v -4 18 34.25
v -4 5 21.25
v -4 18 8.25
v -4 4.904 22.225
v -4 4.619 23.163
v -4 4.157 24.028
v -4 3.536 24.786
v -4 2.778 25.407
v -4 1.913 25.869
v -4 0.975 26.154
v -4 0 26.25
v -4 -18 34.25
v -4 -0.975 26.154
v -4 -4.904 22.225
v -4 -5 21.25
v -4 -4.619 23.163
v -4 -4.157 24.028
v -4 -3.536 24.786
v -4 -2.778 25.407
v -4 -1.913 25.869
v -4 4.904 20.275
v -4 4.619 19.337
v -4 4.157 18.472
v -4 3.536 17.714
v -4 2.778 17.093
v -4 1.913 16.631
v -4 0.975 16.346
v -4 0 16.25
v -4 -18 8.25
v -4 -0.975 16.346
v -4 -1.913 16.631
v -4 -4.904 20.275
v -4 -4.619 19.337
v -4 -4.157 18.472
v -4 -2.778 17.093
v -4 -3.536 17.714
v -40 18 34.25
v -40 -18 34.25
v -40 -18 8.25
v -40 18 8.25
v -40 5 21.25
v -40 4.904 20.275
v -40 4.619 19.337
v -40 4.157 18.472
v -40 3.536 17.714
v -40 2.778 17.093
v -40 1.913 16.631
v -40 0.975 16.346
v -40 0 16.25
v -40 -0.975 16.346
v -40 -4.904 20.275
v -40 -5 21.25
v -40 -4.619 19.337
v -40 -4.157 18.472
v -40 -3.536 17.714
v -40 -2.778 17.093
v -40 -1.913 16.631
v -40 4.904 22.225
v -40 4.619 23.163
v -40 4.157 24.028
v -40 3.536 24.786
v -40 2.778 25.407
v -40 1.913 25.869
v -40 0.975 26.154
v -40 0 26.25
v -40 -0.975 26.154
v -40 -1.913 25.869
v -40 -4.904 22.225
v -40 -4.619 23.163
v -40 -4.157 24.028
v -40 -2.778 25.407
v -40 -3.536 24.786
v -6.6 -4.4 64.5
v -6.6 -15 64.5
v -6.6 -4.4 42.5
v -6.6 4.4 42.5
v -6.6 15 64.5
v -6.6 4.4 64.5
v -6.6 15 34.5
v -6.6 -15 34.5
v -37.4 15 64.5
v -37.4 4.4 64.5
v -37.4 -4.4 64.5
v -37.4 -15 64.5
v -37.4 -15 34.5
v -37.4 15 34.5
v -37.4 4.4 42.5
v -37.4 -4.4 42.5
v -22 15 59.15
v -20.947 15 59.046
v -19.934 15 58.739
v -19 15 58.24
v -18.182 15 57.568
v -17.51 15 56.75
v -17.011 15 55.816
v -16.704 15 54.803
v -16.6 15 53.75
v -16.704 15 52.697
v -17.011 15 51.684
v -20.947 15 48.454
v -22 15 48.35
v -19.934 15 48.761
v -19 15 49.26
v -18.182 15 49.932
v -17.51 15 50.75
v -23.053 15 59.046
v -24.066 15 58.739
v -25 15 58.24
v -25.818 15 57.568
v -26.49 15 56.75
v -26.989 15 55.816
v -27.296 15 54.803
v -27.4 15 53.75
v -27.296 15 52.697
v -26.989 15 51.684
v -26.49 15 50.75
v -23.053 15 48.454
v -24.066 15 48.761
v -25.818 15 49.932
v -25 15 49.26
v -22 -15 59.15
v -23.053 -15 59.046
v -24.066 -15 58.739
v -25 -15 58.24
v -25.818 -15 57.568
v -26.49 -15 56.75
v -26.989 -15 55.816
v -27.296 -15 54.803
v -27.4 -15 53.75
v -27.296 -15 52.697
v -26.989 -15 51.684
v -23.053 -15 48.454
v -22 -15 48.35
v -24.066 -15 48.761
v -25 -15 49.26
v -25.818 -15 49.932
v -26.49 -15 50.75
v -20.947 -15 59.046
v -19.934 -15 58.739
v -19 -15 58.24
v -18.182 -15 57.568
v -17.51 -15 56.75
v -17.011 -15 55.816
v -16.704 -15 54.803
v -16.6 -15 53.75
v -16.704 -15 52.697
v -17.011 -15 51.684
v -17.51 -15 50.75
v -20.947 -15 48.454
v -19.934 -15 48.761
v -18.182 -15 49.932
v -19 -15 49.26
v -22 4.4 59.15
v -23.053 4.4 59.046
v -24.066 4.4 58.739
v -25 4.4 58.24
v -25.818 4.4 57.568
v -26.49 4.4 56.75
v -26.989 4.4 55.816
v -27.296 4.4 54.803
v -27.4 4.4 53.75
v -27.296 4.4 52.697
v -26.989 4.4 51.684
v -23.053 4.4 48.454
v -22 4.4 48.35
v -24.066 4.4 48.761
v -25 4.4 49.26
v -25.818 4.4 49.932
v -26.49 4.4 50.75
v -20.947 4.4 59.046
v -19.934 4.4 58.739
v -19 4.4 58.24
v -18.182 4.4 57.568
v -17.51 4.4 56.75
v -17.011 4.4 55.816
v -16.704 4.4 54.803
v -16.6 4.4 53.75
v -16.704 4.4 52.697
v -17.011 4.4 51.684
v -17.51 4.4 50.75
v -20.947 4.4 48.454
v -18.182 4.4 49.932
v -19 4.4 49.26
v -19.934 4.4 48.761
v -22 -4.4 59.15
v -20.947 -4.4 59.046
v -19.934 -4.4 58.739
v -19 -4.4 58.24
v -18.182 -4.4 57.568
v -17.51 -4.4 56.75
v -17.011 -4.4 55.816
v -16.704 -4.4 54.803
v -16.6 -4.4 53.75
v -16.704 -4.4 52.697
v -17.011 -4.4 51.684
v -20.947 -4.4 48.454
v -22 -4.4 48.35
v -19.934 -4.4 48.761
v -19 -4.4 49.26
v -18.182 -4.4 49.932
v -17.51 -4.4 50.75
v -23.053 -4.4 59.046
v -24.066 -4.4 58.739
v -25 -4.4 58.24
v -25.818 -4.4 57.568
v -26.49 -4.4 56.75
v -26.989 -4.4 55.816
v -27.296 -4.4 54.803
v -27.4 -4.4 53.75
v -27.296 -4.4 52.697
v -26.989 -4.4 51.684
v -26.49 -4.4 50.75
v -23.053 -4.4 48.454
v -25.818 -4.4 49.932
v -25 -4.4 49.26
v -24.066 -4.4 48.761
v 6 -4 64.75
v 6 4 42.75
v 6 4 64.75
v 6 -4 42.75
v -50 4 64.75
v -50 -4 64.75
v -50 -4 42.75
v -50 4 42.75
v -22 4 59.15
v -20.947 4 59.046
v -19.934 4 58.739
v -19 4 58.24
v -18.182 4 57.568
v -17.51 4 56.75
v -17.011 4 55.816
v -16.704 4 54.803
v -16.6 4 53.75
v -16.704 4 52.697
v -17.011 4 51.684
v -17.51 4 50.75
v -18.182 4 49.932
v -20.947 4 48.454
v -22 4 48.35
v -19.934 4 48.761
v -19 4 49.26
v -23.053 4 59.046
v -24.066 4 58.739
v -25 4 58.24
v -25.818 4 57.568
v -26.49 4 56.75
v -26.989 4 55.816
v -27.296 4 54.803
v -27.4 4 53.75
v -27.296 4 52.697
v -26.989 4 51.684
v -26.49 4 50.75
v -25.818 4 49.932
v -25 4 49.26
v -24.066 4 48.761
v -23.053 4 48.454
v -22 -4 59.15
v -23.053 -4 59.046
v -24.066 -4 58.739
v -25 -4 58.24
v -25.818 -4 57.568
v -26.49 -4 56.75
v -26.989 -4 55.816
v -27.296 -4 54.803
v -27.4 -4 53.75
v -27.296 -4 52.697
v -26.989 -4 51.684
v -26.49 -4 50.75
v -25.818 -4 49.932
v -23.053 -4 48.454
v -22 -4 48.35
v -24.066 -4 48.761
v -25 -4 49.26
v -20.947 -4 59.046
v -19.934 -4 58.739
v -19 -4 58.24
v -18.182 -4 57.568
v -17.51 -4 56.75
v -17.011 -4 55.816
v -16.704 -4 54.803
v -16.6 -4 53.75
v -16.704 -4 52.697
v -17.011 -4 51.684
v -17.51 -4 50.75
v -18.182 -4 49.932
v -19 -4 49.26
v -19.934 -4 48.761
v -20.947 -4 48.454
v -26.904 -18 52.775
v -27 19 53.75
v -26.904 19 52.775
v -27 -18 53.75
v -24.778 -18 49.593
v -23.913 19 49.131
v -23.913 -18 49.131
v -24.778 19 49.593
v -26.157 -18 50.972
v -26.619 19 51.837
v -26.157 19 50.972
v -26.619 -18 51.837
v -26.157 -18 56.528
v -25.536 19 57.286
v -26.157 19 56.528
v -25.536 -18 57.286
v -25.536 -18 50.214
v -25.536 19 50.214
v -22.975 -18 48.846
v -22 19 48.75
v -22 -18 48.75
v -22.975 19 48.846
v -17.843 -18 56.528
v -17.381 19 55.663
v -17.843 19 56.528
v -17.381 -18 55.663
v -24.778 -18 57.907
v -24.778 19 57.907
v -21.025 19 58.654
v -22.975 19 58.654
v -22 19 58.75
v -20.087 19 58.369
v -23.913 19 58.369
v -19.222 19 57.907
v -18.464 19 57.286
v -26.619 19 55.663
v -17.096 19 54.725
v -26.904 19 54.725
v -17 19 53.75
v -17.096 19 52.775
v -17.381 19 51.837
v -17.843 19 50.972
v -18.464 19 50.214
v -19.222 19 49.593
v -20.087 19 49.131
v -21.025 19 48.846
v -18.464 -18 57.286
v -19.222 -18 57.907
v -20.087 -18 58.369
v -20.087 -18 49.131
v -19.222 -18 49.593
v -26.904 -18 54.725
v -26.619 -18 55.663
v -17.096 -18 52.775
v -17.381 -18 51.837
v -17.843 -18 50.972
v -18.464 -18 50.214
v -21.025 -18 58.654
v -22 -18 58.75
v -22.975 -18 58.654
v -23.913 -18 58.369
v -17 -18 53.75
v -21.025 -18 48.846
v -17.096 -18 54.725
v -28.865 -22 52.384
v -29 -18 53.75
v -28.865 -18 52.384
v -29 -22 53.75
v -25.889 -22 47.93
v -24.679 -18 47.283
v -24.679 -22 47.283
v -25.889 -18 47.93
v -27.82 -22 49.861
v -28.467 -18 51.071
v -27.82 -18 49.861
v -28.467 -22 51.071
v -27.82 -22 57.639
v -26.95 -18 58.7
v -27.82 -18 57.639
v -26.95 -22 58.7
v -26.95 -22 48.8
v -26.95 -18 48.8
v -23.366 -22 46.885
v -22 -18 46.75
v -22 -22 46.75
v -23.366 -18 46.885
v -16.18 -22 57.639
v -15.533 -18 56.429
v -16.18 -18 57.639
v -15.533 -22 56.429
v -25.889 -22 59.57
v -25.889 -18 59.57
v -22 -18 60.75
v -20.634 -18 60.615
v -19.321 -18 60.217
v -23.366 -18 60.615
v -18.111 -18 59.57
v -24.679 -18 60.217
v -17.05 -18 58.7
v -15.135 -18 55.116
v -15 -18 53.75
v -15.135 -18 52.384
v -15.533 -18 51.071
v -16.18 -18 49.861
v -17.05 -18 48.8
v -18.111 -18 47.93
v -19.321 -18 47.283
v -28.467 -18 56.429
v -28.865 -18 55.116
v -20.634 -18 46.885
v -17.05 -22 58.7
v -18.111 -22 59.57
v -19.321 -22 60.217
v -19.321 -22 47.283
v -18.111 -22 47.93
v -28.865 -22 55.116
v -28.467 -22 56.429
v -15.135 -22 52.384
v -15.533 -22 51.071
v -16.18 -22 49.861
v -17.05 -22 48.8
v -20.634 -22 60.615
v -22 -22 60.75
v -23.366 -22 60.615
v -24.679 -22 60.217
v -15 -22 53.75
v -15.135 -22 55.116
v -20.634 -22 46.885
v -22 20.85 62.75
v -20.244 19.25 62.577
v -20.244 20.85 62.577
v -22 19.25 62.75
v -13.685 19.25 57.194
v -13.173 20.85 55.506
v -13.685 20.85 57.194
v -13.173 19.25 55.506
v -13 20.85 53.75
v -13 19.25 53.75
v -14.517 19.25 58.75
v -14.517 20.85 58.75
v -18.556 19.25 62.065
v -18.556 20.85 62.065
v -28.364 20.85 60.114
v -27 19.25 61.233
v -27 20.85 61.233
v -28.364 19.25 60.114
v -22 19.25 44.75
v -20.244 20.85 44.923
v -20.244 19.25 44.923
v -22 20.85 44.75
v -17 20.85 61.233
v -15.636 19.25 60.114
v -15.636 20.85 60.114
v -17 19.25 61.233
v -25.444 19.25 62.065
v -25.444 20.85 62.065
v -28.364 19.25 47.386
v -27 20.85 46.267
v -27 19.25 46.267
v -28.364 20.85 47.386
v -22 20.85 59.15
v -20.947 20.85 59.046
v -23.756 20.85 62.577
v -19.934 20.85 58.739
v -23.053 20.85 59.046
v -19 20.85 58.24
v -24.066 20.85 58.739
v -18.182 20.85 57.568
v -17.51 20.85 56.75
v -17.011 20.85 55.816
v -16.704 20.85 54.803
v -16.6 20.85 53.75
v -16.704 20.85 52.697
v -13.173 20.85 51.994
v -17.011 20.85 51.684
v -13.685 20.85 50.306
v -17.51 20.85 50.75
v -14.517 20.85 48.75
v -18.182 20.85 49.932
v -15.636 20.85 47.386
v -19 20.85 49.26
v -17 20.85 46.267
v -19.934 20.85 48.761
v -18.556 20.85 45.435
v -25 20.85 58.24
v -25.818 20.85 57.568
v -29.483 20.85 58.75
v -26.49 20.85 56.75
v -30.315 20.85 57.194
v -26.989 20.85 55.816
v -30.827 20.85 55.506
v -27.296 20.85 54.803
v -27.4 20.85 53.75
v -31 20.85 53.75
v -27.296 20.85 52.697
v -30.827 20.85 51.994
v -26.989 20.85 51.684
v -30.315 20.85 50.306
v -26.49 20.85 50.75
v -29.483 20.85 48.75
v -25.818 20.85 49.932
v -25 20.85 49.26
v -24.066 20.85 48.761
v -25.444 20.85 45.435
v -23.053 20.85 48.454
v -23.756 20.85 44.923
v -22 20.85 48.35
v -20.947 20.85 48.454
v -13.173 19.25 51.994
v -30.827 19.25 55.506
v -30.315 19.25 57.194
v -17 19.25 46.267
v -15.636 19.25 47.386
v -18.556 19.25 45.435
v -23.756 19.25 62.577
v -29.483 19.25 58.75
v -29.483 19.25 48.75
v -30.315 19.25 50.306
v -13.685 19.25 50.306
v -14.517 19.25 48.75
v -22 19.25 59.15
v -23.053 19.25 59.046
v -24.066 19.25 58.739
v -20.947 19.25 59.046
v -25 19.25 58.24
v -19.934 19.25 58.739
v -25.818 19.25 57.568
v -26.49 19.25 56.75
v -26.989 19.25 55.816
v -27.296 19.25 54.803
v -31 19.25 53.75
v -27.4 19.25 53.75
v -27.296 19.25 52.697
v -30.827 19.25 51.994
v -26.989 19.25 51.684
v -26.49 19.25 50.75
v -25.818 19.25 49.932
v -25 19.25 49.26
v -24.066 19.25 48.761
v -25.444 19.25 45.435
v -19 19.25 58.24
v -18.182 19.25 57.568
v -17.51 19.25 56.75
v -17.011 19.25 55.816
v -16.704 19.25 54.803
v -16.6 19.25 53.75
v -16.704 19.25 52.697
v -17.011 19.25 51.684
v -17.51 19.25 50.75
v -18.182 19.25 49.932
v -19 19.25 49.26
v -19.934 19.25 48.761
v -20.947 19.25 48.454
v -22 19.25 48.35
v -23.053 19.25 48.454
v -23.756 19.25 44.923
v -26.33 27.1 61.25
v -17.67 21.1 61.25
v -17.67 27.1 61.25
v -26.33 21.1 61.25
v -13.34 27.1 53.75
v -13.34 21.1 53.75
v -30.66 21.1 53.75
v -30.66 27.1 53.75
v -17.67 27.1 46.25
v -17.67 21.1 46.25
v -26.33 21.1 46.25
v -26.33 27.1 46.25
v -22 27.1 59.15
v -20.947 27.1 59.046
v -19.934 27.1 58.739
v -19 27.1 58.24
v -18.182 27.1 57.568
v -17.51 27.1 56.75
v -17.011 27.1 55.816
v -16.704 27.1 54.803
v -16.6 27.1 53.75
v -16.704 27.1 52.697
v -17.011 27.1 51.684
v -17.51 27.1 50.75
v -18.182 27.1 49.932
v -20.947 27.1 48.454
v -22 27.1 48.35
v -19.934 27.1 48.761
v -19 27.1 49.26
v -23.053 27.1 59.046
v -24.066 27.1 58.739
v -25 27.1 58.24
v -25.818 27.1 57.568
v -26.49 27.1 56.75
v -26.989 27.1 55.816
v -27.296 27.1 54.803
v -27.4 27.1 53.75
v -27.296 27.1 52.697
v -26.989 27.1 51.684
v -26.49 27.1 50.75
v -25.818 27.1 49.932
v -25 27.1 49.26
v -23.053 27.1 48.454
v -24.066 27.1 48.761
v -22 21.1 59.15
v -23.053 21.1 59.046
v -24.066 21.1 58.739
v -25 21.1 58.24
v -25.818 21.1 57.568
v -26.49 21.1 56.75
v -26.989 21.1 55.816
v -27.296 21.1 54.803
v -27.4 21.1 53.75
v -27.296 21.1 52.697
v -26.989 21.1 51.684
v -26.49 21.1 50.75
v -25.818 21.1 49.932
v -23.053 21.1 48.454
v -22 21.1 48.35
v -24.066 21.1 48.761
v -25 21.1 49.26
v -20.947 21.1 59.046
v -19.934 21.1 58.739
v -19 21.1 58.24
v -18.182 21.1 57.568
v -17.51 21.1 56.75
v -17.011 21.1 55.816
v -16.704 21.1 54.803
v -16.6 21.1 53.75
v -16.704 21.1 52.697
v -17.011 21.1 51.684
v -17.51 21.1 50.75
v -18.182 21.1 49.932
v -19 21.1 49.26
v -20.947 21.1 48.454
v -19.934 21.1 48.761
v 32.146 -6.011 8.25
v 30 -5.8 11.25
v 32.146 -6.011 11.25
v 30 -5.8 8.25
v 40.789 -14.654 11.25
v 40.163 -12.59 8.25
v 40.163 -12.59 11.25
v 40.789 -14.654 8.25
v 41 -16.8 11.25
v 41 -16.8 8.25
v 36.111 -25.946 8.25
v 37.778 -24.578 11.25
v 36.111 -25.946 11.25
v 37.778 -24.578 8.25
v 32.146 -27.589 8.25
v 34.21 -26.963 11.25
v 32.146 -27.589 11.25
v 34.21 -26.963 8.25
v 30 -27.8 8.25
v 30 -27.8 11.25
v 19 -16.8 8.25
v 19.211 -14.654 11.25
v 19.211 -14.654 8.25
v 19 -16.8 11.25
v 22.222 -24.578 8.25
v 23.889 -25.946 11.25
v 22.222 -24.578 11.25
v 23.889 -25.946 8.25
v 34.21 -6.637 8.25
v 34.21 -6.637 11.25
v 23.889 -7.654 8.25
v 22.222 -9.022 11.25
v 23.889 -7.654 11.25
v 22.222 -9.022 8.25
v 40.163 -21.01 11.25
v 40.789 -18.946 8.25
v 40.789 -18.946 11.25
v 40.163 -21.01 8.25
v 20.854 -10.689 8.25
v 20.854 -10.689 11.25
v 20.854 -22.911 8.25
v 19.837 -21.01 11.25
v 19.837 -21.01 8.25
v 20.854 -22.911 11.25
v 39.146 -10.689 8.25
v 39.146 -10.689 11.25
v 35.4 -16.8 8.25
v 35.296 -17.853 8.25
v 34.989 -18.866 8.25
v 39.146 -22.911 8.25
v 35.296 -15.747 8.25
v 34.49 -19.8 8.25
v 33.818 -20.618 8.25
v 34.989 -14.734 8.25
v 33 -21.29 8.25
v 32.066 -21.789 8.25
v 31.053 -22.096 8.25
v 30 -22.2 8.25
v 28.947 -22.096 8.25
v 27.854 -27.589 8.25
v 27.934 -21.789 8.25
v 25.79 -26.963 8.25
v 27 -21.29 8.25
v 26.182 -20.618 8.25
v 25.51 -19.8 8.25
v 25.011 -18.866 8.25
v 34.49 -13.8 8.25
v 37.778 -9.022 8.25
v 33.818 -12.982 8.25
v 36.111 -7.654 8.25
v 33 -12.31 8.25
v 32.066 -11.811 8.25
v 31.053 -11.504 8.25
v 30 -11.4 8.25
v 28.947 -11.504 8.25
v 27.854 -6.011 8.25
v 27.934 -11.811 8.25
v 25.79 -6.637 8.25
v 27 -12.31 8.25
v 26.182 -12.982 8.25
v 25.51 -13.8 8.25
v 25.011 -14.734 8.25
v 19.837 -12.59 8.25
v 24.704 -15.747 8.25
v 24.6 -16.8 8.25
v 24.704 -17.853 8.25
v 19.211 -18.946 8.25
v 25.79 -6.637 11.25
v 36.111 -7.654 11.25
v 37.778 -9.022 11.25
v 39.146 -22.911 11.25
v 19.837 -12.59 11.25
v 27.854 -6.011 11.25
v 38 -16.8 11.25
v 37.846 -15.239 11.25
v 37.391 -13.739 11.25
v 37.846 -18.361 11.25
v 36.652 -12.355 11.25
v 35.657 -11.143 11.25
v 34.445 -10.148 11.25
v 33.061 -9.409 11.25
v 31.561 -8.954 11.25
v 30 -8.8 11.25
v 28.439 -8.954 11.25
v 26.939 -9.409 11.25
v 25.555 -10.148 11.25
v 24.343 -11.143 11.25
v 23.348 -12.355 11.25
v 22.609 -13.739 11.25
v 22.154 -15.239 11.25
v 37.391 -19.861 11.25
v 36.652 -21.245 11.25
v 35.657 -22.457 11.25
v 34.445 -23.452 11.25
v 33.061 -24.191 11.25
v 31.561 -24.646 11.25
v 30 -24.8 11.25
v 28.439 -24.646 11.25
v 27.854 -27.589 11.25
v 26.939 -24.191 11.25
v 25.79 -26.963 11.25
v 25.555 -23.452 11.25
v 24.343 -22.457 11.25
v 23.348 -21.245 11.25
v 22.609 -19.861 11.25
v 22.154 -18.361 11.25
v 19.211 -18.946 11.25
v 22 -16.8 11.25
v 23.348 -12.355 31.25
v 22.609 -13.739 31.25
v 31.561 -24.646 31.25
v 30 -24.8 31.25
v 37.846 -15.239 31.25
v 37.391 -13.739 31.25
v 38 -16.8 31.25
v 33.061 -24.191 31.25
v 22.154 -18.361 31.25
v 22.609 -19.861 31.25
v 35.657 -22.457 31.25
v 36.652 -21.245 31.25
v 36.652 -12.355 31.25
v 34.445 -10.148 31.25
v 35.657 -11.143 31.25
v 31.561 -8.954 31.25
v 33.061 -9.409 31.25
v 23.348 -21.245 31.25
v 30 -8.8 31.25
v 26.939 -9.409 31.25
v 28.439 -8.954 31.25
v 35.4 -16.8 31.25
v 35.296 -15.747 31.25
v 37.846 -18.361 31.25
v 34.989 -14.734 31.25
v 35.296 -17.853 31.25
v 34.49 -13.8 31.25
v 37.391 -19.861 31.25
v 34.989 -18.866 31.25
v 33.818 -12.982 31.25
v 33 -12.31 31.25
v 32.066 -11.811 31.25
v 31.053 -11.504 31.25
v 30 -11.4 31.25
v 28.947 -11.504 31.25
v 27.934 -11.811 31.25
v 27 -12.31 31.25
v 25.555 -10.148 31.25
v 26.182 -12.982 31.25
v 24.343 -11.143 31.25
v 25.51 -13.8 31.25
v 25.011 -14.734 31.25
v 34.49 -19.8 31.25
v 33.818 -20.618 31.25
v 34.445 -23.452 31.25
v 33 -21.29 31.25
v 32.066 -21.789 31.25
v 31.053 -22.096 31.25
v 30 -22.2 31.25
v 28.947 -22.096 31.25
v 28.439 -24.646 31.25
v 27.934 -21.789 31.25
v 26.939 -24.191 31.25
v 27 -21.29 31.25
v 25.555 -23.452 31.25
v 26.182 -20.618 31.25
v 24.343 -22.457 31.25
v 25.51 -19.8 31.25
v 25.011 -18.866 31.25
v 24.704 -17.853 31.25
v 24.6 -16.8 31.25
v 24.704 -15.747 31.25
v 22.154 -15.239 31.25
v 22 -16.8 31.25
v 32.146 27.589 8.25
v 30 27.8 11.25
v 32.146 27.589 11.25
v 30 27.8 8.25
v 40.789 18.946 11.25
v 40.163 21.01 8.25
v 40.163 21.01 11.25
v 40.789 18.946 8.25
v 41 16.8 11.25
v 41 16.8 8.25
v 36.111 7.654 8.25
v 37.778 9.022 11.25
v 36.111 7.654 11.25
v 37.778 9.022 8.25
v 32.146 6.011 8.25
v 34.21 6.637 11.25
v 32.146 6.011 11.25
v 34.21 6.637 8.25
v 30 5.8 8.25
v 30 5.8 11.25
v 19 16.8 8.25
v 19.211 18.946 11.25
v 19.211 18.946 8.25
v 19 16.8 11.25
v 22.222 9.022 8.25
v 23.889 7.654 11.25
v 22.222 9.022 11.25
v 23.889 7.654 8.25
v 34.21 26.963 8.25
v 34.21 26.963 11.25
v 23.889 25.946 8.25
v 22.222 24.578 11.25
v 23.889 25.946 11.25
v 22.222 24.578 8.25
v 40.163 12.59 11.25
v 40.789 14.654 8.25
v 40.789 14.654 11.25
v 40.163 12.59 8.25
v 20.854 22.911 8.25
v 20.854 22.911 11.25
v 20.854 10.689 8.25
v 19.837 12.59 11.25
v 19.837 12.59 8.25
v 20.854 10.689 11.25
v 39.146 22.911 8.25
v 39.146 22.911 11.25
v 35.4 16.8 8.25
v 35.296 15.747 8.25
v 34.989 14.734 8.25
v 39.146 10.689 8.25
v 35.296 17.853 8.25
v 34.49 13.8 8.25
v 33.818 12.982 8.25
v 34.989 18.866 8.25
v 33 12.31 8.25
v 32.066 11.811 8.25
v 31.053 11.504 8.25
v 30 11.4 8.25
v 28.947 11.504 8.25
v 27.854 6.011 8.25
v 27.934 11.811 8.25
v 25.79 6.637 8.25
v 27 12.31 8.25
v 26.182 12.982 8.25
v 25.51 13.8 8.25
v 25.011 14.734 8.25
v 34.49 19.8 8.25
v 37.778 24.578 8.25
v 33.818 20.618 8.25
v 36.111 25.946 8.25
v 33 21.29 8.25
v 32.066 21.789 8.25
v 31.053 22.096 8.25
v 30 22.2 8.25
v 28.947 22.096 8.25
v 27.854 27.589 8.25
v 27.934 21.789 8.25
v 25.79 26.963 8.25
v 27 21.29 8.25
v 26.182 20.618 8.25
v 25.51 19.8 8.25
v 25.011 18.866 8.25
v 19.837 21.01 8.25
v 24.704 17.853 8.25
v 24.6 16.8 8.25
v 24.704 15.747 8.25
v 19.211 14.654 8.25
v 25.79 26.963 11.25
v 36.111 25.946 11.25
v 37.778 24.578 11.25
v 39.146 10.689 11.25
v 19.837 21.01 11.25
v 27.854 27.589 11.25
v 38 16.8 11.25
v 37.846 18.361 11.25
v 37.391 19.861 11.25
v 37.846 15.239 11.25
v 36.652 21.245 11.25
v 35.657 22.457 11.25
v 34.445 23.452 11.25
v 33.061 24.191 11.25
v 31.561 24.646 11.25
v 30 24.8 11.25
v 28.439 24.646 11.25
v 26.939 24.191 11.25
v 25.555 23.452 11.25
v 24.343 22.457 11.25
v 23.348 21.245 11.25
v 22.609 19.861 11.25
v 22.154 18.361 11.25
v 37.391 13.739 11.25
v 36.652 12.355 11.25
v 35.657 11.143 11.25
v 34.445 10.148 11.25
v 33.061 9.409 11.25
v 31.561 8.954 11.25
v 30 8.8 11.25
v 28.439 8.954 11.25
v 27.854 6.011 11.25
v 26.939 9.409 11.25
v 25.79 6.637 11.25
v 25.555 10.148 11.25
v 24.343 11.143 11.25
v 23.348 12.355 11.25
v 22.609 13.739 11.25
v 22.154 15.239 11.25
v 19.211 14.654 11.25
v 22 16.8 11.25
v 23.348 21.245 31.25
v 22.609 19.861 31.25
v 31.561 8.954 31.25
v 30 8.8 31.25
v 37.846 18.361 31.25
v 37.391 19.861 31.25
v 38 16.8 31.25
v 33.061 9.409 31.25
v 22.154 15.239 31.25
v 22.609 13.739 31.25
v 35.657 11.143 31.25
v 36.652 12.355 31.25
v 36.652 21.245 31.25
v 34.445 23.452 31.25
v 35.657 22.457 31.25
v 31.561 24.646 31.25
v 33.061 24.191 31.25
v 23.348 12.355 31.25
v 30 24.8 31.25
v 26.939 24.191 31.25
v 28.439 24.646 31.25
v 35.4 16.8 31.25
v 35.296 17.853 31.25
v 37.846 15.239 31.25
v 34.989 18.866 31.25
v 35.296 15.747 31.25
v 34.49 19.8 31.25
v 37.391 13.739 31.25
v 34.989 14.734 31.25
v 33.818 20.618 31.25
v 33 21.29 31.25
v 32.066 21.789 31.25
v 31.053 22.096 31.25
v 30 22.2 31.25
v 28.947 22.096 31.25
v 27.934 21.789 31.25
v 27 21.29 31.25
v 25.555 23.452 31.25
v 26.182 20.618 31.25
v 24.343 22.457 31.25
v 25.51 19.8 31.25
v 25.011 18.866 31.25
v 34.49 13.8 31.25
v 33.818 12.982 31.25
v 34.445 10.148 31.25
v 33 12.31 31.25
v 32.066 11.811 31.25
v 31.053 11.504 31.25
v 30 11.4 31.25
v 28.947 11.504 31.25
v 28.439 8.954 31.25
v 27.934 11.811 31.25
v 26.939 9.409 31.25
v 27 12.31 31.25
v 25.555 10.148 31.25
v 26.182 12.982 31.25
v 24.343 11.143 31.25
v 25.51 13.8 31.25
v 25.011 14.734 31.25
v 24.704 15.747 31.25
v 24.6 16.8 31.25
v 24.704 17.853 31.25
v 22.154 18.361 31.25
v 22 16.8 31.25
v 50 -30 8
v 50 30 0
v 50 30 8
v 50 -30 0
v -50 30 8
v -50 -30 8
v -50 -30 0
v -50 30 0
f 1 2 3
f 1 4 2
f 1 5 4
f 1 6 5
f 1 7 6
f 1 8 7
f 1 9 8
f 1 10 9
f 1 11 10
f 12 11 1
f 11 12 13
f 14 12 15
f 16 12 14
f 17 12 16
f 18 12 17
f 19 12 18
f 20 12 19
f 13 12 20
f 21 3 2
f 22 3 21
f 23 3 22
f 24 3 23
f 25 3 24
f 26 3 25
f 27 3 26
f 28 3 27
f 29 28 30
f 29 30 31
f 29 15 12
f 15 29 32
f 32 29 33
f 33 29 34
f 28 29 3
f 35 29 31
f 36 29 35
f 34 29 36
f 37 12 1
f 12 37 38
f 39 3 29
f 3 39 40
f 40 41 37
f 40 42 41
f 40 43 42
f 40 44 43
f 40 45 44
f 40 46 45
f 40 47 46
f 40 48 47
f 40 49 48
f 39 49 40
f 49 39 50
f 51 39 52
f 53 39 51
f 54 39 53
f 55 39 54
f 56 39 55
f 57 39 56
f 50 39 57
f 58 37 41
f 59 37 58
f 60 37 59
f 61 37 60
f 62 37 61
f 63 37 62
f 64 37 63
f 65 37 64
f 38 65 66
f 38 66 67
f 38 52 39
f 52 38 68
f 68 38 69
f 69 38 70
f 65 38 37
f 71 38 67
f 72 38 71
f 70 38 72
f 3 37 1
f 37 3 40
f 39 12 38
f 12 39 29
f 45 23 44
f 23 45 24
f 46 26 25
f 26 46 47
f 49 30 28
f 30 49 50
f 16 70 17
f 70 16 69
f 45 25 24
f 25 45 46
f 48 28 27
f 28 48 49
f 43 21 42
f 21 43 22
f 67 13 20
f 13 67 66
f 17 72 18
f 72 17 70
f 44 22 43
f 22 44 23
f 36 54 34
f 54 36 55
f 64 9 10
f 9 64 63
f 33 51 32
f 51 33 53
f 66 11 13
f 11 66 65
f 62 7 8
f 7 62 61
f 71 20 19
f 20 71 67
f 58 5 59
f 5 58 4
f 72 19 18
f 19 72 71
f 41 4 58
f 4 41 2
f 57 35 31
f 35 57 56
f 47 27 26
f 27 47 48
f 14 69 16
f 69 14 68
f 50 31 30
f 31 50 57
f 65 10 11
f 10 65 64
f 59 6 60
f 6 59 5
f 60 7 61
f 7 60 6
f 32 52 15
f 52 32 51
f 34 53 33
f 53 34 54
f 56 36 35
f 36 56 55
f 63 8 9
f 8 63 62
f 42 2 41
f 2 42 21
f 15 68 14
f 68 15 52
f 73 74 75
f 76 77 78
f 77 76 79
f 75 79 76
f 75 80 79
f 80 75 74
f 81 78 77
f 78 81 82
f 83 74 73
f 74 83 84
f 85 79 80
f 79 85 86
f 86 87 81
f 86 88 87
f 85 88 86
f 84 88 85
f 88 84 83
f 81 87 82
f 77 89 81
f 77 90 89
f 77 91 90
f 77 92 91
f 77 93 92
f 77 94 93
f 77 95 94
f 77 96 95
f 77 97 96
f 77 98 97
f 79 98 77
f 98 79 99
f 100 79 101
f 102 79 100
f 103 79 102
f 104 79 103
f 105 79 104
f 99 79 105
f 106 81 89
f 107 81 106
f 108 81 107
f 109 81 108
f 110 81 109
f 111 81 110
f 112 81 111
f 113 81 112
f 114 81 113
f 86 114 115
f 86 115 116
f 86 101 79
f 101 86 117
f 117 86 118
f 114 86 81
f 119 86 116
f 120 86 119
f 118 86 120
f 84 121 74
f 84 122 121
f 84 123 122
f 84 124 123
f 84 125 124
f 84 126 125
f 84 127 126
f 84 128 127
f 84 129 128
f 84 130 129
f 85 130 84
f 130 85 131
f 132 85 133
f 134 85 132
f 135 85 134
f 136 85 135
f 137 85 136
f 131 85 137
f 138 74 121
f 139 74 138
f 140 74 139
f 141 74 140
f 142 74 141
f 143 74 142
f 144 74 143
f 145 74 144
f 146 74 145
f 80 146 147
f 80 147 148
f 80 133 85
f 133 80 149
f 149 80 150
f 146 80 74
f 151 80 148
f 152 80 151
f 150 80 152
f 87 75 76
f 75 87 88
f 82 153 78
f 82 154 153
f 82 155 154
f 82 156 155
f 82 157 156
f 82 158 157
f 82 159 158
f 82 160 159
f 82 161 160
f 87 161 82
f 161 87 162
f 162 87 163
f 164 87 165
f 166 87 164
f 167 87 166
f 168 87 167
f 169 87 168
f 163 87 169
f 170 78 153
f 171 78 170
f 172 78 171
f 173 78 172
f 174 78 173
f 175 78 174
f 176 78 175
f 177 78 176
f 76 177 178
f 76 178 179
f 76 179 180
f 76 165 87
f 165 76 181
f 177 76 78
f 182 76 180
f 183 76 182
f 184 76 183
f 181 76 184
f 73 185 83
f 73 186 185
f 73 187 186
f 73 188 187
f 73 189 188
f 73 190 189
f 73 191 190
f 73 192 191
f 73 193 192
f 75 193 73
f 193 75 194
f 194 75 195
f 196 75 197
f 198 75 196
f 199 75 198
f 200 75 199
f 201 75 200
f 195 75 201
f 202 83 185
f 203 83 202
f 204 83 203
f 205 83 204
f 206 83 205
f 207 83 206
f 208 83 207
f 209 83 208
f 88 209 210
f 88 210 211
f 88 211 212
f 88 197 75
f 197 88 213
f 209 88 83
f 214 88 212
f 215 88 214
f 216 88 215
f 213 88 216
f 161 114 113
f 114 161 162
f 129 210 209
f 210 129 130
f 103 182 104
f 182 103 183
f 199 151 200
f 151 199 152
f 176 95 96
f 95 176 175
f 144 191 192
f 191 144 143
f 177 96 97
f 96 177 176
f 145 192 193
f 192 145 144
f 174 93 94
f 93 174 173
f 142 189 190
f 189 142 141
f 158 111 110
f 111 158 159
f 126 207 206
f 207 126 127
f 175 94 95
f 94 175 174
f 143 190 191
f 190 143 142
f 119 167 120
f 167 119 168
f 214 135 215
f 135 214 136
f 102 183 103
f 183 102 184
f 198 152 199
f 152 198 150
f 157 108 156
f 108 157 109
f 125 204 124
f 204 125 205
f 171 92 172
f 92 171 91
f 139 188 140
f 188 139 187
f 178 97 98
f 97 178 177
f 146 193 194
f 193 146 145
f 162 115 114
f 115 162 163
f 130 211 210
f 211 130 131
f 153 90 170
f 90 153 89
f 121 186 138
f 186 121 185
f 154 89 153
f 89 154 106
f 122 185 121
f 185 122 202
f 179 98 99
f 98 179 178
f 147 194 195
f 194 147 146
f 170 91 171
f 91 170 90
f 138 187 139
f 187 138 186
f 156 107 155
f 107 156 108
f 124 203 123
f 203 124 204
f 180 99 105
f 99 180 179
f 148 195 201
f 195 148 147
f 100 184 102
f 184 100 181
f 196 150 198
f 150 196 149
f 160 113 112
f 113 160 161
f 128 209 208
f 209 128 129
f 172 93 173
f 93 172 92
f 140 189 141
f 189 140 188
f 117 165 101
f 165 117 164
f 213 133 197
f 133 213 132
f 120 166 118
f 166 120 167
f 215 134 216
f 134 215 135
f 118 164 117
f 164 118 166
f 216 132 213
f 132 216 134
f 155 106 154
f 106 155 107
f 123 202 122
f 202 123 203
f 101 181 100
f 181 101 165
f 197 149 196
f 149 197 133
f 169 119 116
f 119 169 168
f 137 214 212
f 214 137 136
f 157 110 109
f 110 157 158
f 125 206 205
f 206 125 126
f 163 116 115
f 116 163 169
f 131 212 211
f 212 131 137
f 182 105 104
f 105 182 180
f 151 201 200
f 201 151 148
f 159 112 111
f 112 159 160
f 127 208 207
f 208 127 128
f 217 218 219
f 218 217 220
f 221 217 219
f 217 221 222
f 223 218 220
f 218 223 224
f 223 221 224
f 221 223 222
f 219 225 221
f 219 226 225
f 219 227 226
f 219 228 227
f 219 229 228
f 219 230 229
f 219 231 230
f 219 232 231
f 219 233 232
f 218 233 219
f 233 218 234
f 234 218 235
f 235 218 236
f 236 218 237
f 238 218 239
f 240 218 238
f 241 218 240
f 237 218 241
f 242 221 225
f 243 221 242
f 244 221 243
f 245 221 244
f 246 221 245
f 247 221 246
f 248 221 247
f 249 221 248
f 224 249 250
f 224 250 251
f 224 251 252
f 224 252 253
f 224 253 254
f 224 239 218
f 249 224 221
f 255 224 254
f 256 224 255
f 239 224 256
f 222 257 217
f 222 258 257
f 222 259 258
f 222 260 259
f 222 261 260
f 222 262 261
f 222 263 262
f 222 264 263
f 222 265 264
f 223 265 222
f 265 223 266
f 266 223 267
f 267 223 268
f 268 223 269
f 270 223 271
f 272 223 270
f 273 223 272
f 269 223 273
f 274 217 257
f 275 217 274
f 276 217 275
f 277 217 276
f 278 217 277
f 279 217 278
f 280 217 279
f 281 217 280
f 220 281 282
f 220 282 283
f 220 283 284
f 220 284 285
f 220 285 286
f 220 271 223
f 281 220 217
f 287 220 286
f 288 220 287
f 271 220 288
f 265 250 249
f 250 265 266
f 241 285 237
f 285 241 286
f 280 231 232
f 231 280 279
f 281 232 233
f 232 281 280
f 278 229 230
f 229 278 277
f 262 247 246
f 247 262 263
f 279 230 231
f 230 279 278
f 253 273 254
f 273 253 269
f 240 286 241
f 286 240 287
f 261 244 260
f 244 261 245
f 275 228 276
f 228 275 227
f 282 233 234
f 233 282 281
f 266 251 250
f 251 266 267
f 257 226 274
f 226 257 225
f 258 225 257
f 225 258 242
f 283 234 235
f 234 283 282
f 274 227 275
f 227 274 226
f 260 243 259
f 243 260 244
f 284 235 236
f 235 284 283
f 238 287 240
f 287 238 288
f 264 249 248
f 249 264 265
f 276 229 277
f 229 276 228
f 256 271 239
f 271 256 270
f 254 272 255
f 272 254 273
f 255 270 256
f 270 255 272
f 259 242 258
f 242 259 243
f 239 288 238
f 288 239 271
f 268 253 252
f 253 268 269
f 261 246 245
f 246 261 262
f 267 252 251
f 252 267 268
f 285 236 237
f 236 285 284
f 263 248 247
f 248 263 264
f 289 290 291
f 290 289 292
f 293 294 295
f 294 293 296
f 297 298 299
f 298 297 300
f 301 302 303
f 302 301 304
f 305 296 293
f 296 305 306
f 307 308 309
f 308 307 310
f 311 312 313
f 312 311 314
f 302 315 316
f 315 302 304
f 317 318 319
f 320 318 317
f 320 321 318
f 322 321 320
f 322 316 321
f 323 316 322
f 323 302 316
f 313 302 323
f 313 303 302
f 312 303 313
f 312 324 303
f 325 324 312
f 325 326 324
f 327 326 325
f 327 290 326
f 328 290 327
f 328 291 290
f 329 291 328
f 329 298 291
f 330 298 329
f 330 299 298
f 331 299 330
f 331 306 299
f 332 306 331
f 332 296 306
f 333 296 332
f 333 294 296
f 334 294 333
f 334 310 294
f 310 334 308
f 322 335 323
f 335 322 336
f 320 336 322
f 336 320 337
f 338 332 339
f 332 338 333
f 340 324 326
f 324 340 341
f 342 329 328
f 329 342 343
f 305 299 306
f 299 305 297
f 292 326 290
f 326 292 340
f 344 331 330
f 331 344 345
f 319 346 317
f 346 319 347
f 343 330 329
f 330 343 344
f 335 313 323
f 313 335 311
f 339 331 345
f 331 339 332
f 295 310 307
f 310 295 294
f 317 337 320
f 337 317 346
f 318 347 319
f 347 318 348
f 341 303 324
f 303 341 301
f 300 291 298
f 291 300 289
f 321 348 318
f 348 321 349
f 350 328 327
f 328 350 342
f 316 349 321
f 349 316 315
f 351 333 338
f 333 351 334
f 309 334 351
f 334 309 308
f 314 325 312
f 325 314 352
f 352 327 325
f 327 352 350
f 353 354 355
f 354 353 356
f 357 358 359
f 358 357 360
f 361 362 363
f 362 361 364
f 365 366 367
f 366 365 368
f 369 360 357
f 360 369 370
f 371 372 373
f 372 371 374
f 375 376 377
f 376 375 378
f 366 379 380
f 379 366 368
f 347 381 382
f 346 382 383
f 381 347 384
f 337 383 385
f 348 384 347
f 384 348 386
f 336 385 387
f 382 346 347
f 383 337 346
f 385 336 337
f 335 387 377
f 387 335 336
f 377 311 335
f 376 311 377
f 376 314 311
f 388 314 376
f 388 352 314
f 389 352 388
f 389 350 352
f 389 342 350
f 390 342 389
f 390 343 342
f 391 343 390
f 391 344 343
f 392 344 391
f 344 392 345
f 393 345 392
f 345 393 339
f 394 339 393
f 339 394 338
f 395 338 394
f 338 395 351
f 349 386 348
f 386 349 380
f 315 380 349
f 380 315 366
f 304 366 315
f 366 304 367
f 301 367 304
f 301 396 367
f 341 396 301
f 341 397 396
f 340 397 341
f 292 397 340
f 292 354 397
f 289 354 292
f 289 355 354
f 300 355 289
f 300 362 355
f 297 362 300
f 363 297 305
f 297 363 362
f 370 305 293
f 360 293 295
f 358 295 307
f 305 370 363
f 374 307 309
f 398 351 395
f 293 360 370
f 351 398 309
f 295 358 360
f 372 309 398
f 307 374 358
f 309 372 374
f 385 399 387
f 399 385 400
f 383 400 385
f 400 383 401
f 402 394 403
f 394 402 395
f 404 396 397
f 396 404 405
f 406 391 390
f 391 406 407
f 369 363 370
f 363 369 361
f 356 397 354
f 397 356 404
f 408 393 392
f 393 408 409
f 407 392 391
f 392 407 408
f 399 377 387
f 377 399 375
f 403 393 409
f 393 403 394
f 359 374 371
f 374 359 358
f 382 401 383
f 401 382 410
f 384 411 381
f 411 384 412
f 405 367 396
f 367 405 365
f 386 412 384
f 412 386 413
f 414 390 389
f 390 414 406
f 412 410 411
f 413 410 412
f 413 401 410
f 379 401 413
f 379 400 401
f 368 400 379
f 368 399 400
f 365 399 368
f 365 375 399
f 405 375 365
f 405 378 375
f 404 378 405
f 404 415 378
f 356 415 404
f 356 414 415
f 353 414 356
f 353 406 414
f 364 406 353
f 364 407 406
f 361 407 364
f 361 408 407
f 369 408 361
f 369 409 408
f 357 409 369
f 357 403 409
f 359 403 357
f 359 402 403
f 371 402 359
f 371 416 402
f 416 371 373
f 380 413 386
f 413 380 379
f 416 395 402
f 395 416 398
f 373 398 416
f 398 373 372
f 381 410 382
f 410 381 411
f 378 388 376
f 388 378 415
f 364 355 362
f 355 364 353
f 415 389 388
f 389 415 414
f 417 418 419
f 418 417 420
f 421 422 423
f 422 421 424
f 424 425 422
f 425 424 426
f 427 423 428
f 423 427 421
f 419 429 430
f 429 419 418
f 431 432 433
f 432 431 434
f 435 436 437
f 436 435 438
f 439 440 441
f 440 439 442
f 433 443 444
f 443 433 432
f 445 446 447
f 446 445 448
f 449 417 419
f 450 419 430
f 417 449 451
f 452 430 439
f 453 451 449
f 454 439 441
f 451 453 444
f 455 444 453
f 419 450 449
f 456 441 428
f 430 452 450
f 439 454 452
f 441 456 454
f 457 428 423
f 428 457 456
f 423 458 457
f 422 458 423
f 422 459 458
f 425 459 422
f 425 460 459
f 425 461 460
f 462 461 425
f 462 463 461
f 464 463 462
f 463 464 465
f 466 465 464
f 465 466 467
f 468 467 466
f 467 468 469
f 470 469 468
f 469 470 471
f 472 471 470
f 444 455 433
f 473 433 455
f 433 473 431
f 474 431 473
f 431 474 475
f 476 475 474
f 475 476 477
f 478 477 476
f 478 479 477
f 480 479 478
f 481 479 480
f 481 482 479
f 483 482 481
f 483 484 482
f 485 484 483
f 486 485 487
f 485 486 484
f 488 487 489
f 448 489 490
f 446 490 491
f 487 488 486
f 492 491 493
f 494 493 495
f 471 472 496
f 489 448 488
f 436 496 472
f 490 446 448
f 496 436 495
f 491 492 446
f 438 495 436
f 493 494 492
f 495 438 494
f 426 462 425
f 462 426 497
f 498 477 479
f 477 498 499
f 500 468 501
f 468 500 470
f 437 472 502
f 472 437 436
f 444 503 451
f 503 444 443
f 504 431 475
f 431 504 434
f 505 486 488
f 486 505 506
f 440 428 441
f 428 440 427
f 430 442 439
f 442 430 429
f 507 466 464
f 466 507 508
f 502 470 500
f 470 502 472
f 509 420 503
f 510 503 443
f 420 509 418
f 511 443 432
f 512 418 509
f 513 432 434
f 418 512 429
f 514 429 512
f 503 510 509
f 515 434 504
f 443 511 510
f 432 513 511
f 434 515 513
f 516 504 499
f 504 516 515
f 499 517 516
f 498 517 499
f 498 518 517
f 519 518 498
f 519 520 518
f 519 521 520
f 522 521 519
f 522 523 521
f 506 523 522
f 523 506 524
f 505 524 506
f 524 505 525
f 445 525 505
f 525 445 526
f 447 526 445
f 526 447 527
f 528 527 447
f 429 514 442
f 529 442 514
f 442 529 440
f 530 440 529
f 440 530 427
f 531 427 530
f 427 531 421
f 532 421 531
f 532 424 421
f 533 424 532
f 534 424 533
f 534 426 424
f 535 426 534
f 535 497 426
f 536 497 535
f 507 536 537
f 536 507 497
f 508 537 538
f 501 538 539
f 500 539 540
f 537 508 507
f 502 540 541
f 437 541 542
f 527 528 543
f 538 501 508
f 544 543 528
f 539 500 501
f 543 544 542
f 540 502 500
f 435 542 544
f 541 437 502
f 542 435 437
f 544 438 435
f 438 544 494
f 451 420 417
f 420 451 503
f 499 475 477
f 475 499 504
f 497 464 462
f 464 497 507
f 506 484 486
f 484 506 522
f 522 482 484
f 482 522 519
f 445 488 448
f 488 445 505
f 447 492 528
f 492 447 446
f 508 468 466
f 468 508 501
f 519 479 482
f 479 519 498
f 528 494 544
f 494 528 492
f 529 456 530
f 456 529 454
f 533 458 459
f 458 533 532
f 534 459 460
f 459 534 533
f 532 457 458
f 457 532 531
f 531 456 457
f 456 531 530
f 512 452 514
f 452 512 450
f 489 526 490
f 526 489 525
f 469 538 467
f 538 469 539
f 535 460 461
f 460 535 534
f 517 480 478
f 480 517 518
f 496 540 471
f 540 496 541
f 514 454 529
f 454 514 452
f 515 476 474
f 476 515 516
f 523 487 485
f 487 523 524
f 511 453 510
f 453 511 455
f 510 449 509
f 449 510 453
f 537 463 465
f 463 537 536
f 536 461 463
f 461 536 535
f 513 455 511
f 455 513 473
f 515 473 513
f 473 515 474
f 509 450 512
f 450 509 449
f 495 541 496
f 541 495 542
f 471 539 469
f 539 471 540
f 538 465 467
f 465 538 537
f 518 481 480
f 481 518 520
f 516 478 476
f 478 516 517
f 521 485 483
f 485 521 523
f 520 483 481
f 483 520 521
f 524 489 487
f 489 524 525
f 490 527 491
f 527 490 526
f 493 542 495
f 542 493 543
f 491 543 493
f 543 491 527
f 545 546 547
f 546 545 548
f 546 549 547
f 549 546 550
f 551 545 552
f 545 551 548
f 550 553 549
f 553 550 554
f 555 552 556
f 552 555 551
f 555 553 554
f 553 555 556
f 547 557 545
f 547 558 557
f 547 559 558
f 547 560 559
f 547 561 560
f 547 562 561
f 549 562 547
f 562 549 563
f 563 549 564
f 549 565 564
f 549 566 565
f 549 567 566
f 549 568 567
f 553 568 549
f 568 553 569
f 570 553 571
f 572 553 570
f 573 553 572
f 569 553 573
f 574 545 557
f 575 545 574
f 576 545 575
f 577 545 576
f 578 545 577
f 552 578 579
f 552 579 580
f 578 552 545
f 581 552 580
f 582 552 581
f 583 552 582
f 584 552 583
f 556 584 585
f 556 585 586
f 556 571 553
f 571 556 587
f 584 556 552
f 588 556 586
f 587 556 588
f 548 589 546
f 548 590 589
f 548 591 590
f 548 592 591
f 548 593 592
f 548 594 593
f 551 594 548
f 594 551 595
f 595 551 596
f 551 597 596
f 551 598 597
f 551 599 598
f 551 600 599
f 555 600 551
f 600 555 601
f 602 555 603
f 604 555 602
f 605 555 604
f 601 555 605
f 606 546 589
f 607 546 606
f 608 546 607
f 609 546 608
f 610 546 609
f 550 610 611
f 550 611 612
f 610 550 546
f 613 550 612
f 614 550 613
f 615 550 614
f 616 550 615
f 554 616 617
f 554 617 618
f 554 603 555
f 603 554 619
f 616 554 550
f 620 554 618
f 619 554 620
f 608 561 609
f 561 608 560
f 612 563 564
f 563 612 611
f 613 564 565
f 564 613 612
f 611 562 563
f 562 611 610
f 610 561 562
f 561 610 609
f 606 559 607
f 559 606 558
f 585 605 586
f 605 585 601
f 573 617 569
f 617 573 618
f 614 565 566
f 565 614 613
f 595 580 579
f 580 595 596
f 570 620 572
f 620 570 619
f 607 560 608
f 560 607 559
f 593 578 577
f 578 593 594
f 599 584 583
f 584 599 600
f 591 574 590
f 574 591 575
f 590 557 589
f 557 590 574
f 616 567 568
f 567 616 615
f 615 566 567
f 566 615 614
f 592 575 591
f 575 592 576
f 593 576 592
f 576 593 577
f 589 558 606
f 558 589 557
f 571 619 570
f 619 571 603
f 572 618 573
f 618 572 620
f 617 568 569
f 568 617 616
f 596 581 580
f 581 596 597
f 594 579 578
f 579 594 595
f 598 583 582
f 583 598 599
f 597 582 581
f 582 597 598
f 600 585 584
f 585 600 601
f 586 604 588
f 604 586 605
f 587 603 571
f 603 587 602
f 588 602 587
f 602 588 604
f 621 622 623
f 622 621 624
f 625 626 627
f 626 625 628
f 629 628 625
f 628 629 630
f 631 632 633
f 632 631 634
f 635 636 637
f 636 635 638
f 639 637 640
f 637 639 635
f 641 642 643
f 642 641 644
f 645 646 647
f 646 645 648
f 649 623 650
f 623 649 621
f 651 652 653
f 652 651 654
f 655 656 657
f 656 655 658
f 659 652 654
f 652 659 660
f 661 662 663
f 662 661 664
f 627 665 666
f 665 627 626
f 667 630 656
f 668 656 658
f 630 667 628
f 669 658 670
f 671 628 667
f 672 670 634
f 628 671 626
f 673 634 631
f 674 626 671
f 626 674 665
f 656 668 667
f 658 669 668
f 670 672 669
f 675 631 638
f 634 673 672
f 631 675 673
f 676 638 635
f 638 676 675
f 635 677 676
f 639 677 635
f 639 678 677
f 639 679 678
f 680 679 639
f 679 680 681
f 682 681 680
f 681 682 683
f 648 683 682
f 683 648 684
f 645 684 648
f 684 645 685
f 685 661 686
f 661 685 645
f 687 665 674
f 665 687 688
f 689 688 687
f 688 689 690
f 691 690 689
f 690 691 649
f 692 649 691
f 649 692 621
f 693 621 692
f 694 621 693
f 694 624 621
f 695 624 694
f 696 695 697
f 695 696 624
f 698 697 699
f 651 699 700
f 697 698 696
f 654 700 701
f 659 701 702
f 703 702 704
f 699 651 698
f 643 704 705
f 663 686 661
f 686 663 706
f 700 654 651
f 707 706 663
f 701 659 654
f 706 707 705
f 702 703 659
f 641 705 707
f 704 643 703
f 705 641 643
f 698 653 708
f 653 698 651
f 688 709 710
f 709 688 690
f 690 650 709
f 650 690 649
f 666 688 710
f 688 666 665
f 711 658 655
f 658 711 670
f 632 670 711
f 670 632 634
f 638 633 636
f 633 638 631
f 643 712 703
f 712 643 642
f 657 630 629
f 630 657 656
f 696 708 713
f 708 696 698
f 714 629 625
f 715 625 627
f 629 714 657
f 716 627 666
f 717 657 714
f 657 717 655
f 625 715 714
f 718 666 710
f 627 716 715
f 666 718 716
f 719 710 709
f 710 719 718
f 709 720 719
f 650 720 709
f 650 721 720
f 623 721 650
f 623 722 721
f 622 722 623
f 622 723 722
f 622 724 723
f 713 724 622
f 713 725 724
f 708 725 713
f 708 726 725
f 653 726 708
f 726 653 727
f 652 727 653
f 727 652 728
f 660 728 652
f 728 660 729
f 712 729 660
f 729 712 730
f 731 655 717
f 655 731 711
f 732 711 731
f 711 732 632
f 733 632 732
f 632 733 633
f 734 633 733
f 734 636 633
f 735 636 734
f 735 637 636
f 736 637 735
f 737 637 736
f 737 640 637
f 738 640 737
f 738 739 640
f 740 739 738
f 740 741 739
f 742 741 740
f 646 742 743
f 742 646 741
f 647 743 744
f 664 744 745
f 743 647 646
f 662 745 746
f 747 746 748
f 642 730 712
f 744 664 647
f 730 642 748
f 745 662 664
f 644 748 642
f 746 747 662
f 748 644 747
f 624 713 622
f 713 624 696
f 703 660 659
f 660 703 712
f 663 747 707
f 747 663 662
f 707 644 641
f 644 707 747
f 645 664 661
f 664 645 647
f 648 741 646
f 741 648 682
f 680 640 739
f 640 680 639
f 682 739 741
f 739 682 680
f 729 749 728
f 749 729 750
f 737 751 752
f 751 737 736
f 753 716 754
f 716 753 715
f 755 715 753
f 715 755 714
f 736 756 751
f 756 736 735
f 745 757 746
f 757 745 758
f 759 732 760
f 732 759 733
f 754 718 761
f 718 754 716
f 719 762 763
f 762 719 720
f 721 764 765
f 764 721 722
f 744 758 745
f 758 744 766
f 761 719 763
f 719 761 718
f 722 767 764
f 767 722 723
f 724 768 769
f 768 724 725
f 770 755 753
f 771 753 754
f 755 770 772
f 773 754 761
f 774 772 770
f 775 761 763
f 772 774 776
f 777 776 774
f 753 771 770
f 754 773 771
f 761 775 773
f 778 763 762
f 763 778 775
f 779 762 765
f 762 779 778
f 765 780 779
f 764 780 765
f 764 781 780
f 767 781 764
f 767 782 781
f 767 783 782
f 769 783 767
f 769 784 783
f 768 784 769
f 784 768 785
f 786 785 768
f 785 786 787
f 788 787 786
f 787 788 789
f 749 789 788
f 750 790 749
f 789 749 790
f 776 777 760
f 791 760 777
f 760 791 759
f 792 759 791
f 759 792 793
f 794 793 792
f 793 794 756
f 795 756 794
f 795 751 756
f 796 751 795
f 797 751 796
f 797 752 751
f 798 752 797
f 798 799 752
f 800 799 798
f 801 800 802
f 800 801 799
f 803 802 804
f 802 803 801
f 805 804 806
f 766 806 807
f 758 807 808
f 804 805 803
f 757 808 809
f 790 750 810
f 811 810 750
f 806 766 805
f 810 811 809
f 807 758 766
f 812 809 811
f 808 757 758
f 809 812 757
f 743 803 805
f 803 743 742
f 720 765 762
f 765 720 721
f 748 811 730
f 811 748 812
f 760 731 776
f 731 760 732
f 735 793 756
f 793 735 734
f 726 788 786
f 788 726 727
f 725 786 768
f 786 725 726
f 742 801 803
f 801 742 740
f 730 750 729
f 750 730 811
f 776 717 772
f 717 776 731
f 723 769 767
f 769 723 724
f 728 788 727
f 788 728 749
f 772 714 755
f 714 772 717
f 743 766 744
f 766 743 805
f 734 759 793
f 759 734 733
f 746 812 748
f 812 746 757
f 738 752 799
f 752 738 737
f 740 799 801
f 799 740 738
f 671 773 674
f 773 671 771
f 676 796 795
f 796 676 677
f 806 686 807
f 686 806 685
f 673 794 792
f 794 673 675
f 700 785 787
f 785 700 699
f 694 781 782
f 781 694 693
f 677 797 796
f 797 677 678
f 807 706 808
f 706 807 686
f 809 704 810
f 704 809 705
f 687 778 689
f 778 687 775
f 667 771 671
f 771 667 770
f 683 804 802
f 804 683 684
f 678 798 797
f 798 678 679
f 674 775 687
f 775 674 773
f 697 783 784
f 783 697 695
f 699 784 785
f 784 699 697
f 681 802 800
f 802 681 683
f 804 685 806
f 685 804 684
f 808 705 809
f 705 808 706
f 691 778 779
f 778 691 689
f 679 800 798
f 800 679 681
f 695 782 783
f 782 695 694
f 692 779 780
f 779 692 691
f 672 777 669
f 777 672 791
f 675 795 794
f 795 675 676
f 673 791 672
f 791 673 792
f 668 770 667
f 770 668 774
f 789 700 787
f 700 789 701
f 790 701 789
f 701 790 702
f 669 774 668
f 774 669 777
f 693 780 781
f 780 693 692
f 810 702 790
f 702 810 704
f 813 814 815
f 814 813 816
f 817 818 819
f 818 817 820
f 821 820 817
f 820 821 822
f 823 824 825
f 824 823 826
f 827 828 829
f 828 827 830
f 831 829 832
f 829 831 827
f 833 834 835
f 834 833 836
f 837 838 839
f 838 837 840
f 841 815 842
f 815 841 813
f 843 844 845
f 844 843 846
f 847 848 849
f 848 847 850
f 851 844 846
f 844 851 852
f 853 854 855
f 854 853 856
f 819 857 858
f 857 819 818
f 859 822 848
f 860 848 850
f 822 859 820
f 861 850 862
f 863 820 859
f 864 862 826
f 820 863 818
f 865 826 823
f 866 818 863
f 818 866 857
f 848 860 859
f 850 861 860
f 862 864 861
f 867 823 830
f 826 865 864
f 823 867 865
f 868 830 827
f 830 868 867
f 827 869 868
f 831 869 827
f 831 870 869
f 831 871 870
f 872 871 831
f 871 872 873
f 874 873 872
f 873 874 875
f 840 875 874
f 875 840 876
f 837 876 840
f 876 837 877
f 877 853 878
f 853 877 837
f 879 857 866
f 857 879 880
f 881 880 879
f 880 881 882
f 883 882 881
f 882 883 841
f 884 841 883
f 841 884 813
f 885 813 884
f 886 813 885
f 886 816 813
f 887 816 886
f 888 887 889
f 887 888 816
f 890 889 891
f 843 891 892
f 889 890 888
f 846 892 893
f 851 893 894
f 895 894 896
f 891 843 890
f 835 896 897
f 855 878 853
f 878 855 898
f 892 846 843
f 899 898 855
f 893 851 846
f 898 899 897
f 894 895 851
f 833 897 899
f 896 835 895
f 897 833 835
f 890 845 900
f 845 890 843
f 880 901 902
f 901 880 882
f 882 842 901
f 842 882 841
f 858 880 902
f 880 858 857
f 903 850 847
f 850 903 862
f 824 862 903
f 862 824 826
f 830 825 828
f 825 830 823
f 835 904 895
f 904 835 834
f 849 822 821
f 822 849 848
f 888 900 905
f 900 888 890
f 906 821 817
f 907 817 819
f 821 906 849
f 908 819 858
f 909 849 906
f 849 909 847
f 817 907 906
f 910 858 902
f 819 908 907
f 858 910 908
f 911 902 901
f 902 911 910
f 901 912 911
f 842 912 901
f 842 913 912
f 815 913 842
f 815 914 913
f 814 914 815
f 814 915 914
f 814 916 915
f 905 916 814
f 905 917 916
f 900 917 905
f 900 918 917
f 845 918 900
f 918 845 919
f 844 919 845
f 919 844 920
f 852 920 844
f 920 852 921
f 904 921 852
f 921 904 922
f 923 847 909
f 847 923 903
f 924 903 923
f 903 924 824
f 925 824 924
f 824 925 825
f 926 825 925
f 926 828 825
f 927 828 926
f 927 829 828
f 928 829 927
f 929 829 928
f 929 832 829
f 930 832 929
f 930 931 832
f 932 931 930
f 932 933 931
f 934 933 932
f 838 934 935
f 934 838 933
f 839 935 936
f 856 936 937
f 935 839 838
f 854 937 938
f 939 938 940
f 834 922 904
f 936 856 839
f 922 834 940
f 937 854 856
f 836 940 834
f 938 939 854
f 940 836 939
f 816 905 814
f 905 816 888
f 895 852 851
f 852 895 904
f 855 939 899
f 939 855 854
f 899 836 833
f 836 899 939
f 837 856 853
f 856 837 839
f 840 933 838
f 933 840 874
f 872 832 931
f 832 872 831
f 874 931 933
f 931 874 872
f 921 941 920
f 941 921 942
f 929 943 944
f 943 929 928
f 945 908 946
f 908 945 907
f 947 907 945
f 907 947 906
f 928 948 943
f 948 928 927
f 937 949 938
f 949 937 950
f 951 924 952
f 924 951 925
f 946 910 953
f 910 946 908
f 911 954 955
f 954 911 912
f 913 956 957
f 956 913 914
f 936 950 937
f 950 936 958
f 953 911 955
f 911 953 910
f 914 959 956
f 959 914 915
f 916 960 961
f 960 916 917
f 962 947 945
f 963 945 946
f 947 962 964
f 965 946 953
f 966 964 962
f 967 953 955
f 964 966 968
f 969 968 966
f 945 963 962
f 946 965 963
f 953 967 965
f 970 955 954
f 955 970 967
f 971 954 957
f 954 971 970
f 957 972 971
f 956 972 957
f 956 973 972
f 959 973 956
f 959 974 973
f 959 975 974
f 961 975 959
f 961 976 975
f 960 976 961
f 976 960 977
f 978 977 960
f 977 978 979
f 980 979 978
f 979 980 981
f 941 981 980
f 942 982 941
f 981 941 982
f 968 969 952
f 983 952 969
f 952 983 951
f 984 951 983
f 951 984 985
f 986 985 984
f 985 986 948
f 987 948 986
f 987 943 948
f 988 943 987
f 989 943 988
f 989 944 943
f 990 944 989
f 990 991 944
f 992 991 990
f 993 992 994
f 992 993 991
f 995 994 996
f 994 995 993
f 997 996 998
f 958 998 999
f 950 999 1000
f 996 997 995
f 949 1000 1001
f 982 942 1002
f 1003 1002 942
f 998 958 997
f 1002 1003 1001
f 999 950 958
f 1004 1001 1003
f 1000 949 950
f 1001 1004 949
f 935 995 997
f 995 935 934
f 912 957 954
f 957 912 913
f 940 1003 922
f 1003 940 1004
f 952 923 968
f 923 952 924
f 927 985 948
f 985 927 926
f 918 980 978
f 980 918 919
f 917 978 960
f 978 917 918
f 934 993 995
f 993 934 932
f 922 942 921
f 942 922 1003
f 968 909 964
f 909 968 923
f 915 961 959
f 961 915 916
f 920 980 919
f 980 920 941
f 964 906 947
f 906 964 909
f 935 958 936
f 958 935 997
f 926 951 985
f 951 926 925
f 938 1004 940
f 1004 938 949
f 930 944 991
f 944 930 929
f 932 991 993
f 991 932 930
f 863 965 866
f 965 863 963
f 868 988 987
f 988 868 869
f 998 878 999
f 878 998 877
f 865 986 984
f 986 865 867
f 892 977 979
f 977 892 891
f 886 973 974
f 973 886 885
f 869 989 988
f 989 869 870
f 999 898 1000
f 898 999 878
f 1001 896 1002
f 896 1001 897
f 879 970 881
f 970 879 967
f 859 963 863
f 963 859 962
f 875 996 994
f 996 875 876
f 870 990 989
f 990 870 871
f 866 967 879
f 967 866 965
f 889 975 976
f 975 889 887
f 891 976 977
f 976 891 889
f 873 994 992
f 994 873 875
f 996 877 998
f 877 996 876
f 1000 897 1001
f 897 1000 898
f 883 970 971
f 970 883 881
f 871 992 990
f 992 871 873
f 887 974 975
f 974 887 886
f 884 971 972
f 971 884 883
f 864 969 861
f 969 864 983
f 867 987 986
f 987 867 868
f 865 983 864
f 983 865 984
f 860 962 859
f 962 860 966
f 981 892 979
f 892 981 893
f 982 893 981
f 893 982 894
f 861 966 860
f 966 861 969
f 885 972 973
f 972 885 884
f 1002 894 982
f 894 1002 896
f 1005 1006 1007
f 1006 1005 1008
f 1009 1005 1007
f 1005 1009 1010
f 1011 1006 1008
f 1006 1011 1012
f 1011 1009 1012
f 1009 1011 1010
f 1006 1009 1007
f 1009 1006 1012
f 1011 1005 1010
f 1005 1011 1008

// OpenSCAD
$fn = 32;

// ------------------------------------------------------------------------
// Indexing jig: plate 100 x 60 mm, pin d10
// Every part is its own module, assembly() places every instance.
// ------------------------------------------------------------------------

// --- part 1 ---
module jig_plate() {
  difference() {
    translate([-50, -30, 0]) cube([100, 60, 8]);
  }
}

// --- part 2 ---
module locator_block() {
  difference() {
    translate([-18, -18, 0]) cube([36, 36, 26]);
    translate([0, 0, 13]) rotate([0, 90, 0]) cylinder(h = 38, d = 10, center = true);
  }
}

// --- part 3 ---
module index_fork() {
  difference() {
    translate([-15.4, -15, 0]) cube([30.8, 30, 30]);
    translate([-16.4, -4.4, 8]) cube([32.8, 8.8, 23]);
    translate([0, 0, 19.25]) rotate([90, 0, 0]) cylinder(h = 32, d = 10.8, center = true);
  }
}

// --- part 4 ---
module index_arm() {
  difference() {
    translate([-28, -4, 0]) cube([56, 8, 22]);
    translate([0, 0, 11]) rotate([90, 0, 0]) cylinder(h = 10, d = 10.8, center = true);
  }
}

// --- part 5 ---
module index_pin() {
  rotate([0, 90, 0]) cylinder(h = 38, d = 10, center = true);
  translate([-22, 0, 0]) rotate([0, 90, 0]) cylinder(h = 4, d = 14);
}

// --- part 6 ---
module pin_washer() {
  difference() {
      translate([0, 0, 0]) cylinder(h = 1.6, d = 18);
      translate([0, 0, -1]) cylinder(h = 3.6, d = 10.8);
    }
}

// --- part 7 ---
module lock_nut() {
  difference() {
    linear_extrude(height = 6) polygon(points = [[8.66, 0], [4.33, 7.5], [-4.33, 7.5], [-8.66, 0], [-4.33, -7.5], [4.33, -7.5]]);
    translate([0, 0, -1]) cylinder(h = 8, d = 10.8);
  }
}

// --- part 8 ---
module guide_bush_a() {
  difference() {
    union() {
      cylinder(h = 3, d = 22);
      translate([0, 0, 3]) cylinder(h = 20, d = 16);
    }
    translate([0, 0, -1]) cylinder(h = 25, d = 10.8);
  }
}

// --- part 9 ---
module guide_bush_b() {
  difference() {
    union() {
      cylinder(h = 3, d = 22);
      translate([0, 0, 3]) cylinder(h = 20, d = 16);
    }
    translate([0, 0, -1]) cylinder(h = 25, d = 10.8);
  }
}

// --- assembly ---
module assembly() {
  color([0.80, 0.24, 0.20]) translate([0, 0, 0]) rotate([0, 0, 0]) jig_plate();
  color([0.20, 0.45, 0.75]) translate([-22, 0, 8.25]) rotate([0, 0, 0]) locator_block();
  color([0.25, 0.62, 0.32]) translate([-22, 0, 34.5]) rotate([0, 0, 0]) index_fork();
  color([0.92, 0.70, 0.18]) translate([-22, 0, 42.75]) rotate([0, 0, 0]) index_arm();
  color([0.58, 0.35, 0.70]) translate([-22, 0, 53.75]) rotate([0, 0, 90]) index_pin();
  color([0.16, 0.66, 0.66]) translate([-22, 20.85, 53.75]) rotate([90, 0, 0]) pin_washer();
  color([0.85, 0.48, 0.18]) translate([-22, 27.1, 53.75]) rotate([90, 0, 0]) lock_nut();
  color([0.55, 0.60, 0.65]) translate([30, -16.8, 8.25]) rotate([0, 0, 0]) guide_bush_a();
  color([0.75, 0.30, 0.55]) translate([30, 16.8, 8.25]) rotate([0, 0, 0]) guide_bush_b();
}

assembly();
